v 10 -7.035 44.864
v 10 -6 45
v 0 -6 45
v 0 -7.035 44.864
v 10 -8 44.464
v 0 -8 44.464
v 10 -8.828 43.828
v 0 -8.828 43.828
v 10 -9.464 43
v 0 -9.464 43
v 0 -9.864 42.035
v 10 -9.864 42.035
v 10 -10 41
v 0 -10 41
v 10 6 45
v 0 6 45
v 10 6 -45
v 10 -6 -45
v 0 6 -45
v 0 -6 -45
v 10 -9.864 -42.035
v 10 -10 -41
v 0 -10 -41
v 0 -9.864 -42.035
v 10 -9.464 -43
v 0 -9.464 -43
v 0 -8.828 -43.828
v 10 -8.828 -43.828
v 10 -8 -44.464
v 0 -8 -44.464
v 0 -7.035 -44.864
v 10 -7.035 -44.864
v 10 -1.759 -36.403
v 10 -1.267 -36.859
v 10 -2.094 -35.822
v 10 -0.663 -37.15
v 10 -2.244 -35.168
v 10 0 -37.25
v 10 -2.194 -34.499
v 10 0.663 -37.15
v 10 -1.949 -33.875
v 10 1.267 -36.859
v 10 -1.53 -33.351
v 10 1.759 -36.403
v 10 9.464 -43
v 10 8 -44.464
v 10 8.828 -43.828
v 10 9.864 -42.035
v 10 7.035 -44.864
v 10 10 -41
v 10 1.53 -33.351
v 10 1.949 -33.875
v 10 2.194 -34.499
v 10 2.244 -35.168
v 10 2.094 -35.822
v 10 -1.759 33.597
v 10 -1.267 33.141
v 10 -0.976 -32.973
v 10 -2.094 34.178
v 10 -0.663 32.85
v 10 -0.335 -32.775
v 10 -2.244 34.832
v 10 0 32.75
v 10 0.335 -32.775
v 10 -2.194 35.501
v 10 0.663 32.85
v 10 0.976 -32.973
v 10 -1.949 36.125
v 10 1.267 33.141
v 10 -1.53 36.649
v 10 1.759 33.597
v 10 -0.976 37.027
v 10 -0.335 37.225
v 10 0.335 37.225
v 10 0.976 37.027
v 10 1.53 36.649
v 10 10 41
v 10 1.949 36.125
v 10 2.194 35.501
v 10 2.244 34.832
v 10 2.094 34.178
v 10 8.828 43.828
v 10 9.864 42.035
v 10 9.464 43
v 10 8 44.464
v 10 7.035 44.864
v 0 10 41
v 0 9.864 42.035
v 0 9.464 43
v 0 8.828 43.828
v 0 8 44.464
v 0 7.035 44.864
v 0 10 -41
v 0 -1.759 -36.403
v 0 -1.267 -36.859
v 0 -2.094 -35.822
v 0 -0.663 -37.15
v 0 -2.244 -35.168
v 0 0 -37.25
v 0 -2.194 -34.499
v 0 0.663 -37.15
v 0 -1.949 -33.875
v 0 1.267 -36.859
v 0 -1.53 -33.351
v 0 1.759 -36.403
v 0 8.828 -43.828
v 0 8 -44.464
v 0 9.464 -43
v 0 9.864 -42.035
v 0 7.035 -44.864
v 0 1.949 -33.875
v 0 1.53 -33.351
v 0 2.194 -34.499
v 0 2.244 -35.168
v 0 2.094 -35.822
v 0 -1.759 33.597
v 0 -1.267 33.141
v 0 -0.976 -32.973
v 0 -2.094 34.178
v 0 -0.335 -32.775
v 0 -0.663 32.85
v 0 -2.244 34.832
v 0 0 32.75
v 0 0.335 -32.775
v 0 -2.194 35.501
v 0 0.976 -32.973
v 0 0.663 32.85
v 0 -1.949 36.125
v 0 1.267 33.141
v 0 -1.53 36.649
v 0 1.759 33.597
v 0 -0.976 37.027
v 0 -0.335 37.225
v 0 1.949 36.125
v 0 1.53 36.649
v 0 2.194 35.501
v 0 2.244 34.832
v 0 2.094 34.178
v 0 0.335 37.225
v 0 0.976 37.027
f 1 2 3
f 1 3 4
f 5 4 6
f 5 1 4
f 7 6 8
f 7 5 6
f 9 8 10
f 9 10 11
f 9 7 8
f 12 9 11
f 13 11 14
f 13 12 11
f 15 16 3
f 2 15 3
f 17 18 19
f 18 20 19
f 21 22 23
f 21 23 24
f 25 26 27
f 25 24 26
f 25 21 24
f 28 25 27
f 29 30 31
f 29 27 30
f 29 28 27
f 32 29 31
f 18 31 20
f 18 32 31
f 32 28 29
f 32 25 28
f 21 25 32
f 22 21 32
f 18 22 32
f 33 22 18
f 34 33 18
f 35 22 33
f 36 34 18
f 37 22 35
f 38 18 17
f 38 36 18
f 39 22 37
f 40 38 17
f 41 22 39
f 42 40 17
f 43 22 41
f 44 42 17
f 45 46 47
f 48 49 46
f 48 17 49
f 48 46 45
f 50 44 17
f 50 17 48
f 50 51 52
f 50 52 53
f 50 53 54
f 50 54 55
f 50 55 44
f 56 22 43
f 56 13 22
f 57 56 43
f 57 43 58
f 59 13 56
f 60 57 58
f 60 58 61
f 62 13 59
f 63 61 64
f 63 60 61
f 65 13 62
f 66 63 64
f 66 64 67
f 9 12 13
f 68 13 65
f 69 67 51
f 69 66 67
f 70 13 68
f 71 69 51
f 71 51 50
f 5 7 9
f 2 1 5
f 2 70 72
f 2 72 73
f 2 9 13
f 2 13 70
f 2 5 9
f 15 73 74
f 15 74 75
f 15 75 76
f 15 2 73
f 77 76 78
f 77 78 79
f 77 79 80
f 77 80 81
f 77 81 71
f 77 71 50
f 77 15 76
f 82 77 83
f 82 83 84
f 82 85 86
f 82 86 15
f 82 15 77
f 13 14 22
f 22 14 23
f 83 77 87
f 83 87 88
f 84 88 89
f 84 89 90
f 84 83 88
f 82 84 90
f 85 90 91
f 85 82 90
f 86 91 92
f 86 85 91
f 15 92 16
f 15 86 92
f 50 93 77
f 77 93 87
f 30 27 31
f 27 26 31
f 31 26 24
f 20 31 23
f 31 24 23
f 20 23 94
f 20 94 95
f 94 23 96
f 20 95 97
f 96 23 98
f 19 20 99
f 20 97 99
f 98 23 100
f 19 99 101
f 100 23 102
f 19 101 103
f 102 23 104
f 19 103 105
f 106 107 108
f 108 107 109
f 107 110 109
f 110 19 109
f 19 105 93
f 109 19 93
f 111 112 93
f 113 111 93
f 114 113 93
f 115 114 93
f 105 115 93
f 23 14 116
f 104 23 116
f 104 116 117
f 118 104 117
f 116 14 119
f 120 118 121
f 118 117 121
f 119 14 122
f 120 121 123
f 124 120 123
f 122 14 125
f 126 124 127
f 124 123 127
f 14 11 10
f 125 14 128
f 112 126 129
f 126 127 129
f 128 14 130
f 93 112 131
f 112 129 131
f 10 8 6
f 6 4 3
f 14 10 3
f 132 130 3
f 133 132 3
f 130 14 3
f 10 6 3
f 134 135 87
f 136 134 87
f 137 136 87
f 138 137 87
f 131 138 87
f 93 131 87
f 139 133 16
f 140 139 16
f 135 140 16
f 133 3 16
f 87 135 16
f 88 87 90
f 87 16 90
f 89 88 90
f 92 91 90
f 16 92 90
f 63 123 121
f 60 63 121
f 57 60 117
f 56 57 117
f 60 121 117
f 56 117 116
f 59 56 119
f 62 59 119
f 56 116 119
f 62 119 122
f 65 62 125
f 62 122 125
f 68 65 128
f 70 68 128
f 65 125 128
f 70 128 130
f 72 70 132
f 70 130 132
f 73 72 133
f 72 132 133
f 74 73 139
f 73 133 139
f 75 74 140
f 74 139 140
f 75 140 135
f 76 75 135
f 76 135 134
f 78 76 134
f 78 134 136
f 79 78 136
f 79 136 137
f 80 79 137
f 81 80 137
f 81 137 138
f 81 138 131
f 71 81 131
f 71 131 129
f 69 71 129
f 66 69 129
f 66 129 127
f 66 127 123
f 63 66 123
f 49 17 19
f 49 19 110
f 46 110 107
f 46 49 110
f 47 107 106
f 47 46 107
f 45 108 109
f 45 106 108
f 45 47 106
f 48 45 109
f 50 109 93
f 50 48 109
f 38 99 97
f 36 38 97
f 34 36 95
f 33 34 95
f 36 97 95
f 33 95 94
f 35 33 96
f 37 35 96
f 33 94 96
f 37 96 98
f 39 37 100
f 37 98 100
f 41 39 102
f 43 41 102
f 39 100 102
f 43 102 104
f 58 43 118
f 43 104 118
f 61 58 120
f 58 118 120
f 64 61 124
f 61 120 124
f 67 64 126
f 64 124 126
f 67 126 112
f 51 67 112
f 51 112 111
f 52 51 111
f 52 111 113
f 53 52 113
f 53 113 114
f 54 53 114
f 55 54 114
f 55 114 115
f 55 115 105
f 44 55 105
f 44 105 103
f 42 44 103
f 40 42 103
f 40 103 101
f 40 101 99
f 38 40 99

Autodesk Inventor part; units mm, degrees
ref_plane "YZ Plane" through (0, 0, 0) normal (1, 0, 0) x (0, 1, 0)
ref_plane "XZ Plane" through (0, 0, 0) normal (0, 1, 0) x (-1, 0, 0)
ref_plane "XY Plane" through (0, 0, 0) normal (0, 0, 1) x (1, 0, 0)
sketch "Skizze1" plane through (0, 0, 0) normal (1, 0, 0) x (0, 1, 0)
  line L0 (10, 45) -> (-10, 45)
  line L1 (-10, 45) -> (-10, -45)
  line L2 (-10, -45) -> (10, -45)
  line L3 (10, -45) -> (10, 45)
  line L4 (10, 45) -> (-10, -45) construction
  line L5 (-10, 45) -> (10, -45) construction
  point P0 (0, 0)
  dimension "d0" = 90
  dimension "d1" = 20
extrude "Extrusion1" add sketch "Skizze1" along normal blind 10
sketch "Skizze2" plane through (10, 0, 0) normal (1, 0, 0) x (0, 0, -1)
  line L0 (-45, 10) -> (-45, -10) projected
  point P0 (0, 0)
  point P1 (-35, 0)
  point P2 (35, 0)
  dimension "d4" = 10
  dimension "d5" = 70
hole "Bohrung1" at (10, 0, 35) at (10, 0, -35) direction (-1, 0, 0) diameter 4.5 end through all
fillet "Rundung1" radius 4 4 edges at (5, 10, 45) (5, -10, 45) (5, -10, -45) (5, 10, -45)
properties part number "103.019.01_Distanz_Wand"
